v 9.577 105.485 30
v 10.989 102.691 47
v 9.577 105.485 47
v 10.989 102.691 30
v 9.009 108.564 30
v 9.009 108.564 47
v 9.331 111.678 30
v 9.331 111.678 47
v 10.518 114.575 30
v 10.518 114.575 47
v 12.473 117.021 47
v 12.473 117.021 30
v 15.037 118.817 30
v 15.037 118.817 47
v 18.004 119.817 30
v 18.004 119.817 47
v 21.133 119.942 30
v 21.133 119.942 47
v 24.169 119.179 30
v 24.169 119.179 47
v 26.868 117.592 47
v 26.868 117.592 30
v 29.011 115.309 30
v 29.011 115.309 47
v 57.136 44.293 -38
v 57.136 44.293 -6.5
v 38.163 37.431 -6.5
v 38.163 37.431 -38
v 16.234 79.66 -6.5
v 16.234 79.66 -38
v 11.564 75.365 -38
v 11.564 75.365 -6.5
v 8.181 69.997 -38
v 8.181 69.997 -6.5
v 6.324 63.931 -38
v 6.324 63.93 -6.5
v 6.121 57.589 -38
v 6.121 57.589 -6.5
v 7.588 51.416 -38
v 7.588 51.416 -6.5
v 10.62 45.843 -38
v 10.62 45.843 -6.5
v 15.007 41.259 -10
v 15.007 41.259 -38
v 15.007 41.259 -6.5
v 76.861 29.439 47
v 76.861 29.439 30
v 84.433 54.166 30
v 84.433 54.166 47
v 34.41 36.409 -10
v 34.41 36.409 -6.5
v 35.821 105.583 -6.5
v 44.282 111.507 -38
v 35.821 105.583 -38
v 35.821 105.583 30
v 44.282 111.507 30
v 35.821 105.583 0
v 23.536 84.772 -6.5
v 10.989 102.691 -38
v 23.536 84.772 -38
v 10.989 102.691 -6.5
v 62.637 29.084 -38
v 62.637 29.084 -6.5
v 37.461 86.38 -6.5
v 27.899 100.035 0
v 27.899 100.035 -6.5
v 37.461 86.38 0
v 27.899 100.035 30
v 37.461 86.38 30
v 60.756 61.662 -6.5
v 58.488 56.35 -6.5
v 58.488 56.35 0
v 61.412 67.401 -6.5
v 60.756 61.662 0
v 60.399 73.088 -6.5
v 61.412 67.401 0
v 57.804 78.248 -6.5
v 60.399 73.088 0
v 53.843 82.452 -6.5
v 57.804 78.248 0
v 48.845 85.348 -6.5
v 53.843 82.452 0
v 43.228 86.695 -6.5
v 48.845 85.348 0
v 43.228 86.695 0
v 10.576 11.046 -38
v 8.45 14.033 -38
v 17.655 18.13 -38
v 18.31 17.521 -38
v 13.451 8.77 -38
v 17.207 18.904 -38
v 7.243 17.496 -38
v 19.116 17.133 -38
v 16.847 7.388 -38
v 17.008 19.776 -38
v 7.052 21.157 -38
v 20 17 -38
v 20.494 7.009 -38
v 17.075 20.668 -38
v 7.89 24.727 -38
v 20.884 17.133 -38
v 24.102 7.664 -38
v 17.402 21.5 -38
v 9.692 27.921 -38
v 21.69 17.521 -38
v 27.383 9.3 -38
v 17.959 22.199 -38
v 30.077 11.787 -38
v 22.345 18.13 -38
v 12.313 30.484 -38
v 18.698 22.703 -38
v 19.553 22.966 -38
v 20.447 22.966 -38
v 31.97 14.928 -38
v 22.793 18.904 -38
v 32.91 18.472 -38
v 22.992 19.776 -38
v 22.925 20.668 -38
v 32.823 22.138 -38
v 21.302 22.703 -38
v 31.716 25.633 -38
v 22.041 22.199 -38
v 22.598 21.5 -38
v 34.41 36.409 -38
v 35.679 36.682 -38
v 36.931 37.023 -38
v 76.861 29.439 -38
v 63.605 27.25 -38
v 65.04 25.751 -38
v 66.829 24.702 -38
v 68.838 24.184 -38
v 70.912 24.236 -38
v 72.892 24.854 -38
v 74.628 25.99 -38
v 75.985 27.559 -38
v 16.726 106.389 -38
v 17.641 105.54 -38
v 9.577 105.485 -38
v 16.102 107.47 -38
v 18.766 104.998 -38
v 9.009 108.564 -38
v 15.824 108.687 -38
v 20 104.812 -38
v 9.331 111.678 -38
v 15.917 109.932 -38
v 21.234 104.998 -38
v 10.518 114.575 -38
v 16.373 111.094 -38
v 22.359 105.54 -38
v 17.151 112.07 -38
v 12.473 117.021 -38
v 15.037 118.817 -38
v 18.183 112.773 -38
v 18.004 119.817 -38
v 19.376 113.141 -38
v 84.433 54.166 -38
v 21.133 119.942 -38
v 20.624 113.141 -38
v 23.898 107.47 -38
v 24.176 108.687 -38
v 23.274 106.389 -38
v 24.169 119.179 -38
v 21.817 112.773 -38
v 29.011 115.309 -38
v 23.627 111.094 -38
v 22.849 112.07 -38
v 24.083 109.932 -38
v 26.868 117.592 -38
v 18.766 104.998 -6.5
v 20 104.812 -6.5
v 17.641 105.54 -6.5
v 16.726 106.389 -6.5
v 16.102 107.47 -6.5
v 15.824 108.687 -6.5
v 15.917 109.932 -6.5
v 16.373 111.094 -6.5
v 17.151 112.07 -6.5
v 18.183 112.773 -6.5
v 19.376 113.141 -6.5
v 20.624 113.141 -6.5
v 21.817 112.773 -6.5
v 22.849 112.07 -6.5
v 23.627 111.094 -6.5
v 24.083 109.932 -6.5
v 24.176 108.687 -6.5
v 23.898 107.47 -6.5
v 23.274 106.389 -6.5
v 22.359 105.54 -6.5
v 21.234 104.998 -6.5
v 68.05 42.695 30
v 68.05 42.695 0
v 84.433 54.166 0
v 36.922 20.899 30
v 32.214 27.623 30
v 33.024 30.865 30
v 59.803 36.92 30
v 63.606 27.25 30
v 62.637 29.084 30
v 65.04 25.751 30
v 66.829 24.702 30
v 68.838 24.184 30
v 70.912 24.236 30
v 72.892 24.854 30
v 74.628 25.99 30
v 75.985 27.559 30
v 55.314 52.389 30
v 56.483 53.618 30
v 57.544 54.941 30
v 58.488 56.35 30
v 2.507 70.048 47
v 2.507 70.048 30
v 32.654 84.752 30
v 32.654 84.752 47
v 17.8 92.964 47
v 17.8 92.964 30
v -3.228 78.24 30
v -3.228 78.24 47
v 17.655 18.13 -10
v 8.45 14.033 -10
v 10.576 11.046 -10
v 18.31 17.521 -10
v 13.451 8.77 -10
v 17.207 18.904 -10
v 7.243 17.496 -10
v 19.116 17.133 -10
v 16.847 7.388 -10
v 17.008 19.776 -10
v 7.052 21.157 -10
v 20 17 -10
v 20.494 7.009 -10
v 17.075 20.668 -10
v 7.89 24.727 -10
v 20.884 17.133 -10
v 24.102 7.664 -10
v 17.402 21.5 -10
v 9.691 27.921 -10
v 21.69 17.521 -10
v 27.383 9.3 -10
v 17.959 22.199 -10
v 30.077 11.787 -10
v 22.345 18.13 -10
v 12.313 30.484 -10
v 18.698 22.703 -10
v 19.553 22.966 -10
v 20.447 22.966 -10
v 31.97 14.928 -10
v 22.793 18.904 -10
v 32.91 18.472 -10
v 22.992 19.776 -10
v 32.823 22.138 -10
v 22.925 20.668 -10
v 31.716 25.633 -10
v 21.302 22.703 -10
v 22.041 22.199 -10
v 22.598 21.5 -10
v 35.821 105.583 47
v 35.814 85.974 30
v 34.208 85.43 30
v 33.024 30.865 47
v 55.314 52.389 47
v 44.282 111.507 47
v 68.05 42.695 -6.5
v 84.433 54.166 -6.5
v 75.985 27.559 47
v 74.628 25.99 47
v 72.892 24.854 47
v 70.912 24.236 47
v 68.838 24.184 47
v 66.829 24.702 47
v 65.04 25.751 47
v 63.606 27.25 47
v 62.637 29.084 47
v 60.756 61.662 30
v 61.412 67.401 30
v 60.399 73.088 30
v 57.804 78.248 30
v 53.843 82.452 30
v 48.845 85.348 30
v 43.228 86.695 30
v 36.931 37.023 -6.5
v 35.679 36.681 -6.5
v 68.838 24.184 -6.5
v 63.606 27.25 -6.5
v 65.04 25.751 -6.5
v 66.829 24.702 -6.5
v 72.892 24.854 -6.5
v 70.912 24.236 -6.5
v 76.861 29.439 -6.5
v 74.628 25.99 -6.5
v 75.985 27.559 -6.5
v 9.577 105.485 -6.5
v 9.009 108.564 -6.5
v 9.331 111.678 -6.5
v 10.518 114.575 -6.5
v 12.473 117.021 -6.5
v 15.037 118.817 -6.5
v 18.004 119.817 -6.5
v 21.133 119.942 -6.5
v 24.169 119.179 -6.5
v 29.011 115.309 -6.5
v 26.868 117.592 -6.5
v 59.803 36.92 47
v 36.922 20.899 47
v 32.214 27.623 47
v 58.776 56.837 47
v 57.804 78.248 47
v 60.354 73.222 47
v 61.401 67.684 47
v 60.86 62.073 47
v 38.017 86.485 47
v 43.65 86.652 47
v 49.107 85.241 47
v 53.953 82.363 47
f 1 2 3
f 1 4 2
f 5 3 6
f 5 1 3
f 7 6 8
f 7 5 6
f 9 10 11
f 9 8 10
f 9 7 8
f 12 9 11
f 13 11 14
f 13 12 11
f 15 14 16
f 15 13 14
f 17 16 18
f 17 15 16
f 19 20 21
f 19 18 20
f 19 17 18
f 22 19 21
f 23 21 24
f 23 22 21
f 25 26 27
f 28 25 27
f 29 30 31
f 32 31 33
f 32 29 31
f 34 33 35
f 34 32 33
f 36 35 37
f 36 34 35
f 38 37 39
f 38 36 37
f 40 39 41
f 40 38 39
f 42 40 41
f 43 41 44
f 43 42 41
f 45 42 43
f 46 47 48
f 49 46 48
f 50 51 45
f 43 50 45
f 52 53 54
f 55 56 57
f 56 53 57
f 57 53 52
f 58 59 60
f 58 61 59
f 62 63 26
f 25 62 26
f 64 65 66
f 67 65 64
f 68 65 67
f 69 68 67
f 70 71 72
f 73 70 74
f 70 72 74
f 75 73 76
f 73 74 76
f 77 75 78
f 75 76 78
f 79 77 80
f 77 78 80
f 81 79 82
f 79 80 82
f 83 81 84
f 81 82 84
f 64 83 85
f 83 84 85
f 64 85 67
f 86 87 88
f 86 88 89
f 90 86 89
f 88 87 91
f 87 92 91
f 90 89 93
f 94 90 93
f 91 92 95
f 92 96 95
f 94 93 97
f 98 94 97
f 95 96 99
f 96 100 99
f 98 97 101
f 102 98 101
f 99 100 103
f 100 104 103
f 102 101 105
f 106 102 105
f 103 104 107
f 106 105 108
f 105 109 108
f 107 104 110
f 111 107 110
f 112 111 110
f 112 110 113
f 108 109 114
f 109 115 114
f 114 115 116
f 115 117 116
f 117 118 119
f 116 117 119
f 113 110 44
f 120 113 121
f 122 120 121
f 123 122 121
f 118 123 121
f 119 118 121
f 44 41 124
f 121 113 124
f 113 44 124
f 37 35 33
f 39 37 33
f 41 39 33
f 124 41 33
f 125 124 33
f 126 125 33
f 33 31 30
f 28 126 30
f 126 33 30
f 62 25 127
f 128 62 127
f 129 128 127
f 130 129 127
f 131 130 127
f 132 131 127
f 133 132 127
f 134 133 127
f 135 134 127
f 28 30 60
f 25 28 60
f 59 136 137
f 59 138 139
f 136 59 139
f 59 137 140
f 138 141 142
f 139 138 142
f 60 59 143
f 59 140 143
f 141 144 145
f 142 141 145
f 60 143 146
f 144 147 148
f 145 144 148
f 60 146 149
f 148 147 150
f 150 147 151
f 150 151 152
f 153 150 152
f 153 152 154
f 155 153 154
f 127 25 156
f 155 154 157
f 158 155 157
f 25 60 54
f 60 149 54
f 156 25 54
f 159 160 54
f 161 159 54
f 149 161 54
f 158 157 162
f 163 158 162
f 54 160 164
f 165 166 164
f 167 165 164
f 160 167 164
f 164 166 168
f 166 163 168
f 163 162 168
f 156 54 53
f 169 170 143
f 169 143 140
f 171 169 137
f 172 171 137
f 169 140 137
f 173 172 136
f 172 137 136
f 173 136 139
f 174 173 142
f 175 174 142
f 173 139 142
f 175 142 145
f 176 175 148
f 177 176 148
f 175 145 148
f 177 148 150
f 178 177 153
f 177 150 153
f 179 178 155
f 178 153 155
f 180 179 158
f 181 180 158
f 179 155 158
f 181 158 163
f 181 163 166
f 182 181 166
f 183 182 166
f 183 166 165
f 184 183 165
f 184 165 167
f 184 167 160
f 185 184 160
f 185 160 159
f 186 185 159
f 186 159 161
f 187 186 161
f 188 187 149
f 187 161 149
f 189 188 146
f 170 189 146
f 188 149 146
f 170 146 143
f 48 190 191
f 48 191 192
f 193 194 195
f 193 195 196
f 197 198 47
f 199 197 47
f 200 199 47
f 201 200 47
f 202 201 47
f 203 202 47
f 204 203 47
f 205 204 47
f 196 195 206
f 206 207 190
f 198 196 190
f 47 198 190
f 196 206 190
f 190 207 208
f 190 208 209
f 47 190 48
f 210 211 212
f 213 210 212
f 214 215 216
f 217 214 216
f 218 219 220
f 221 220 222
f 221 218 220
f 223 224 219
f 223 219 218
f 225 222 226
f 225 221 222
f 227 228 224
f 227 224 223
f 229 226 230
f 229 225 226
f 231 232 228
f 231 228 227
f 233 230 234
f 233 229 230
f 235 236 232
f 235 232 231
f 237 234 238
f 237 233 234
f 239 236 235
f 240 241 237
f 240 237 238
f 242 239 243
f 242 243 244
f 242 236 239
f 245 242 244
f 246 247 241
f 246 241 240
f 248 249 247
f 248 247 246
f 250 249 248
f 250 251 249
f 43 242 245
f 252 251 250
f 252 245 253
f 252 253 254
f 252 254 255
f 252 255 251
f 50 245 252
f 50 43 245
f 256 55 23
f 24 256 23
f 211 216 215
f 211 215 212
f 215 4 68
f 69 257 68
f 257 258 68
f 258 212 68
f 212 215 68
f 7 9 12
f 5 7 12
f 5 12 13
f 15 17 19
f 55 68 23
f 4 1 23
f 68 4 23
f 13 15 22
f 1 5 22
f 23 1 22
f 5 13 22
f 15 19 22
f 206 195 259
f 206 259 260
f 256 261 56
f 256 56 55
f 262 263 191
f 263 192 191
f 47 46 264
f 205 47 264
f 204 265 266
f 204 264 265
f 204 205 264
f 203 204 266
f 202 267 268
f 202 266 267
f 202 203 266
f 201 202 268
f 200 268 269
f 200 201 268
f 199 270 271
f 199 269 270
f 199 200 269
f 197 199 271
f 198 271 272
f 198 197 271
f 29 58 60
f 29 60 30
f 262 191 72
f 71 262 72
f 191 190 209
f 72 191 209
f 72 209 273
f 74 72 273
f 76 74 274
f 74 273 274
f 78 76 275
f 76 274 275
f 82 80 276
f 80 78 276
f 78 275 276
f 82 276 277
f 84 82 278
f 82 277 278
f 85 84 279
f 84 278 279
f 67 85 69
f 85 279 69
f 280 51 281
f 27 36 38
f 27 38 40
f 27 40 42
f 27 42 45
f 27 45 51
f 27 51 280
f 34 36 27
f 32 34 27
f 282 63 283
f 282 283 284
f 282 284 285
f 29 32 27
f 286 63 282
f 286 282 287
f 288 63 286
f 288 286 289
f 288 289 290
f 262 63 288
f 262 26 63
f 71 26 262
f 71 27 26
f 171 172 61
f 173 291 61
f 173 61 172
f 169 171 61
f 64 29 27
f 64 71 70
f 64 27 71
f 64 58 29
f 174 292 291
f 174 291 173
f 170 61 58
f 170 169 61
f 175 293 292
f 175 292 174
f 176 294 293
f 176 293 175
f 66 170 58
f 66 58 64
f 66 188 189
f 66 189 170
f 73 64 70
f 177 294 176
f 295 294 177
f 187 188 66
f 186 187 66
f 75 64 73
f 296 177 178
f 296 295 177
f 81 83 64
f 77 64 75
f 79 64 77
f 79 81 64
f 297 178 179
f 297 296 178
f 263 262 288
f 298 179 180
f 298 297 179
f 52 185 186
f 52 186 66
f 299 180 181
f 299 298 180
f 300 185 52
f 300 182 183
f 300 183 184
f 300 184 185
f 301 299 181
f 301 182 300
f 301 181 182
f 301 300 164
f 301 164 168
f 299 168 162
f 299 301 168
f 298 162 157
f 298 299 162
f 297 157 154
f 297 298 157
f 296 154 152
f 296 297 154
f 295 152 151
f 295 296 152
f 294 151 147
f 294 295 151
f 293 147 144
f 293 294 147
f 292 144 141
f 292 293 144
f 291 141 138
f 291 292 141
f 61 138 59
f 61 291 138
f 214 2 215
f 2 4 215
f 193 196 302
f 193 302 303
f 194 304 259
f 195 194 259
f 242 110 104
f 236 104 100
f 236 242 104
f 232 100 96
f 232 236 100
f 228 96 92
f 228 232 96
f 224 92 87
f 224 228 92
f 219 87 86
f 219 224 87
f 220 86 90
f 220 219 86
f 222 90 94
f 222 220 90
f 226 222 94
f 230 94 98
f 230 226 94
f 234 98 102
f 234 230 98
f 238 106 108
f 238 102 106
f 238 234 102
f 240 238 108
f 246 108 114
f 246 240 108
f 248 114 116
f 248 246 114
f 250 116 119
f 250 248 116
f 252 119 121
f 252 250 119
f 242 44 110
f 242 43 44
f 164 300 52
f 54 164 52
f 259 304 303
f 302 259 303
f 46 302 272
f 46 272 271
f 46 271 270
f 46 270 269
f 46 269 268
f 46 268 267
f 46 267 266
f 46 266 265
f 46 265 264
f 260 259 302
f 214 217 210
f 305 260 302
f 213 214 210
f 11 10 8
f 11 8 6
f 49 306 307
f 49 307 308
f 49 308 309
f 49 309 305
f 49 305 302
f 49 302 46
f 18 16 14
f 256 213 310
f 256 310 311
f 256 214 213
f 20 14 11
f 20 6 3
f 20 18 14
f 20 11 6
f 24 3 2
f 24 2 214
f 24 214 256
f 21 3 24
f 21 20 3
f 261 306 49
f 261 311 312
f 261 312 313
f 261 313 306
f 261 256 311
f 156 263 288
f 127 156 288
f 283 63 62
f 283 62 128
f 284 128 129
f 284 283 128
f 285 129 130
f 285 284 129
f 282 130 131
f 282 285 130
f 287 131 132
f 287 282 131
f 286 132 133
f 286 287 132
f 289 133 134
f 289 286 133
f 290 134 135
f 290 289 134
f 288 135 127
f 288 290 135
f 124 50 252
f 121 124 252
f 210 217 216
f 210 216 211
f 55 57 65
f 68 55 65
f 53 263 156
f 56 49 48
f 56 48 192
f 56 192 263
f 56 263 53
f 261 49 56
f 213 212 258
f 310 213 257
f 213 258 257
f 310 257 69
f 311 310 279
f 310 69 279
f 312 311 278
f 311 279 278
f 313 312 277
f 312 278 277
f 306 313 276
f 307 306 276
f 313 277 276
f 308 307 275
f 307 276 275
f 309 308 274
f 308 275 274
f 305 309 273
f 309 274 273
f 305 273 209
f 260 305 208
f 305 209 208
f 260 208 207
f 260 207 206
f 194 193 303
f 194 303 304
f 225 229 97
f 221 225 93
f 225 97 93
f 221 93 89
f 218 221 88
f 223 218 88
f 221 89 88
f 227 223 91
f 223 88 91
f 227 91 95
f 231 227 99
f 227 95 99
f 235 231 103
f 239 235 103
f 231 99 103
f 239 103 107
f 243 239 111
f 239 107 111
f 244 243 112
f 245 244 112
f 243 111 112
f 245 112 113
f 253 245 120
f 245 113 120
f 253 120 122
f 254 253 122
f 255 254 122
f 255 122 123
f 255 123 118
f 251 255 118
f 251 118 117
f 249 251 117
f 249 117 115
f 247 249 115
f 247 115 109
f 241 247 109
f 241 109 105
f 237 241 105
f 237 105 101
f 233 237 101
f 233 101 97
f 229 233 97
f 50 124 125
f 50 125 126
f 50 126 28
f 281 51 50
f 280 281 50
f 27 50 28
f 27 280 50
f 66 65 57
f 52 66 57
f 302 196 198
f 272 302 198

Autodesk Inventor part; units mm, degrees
ref_plane "YZ Plane" through (0, 0, 0) normal (1, 0, 0) x (0, 1, 0)
ref_plane "XZ Plane" through (0, 0, 0) normal (0, 1, 0) x (-1, 0, 0)
sketch "Sketch1" plane through (0, 0, 0) normal (0, 0, 1) x (1, 0, 0)
  circle A0 centre (20, 109) radius 11
  circle A1 centre (20, 20) radius 13
  line L0 (20, 109) -> (20, 20) construction
  line L1 (0, 144) -> (0, -24) construction
  line L2 (-16.8865, 0) -> (101.3193, 0) construction
  circle A2 centre (30, 60) radius 24
  line L3 (23.5359, 84.7724) -> (16.2342, 79.6596)
  line L4 (10.9893, 102.6907) -> (23.5359, 84.7724)
  line L5 (30, 60) -> (20, 20) construction
  line L6 (15.0071, 41.2593) -> (12.3132, 30.484)
  line L7 (34.4099, 36.4086) -> (31.7161, 25.6333)
  line L8 (29.0107, 115.3093) -> (35.8214, 105.5826)
  line L9 (35.8214, 105.5826) -> (44.2824, 111.507)
  line L10 (44.2824, 111.507) -> (84.4327, 54.1663)
  line L11 (84.4327, 54.1663) -> (38.1631, 37.4309)
  circle A3 centre (69.6897, 31.6354) radius 7.5
  line L12 (84.4327, 54.1663) -> (76.861, 29.4394)
  line L13 (62.6369, 29.0844) -> (57.1359, 44.2933)
  point P0 (0, 0)
  dimension "d0" = 89
  dimension "d2" = 48
  dimension "d3" = 20
  dimension "d4" = 20
  dimension "d5" = 26
  dimension "d6" = 22
  dimension "d7" = 40
  dimension "d8" = 10
  dimension "d9" = 35
  dimension "d10" = 20
  dimension "d11" = 10
  dimension "d13" = 10.3289
  dimension "d14" = 70
  dimension "d15" = 25
  dimension "d17" = 80
  dimension "d18" = 15
extrude "Extrusion1" add sketch "Sketch1" against normal blind 38
ref_plane "Work Plane1" through (0, 0, 30) normal (0, 0, 1) x (1, 0, 0)
sketch "Sketch2" plane through (0, 0, 30) normal (0, 0, 1) x (1, 0, 0)
  line L0 (10.9893, 102.6907) -> (23.5359, 84.7724) projected
  line L1 (23.5359, 84.7724) -> (16.2342, 79.6596) projected
  arc A0 (16.2342, 79.6596) -> (15.0071, 41.2593) centre (30, 60) ccw projected
  line L2 (15.0071, 41.2593) -> (12.3132, 30.484) projected
  arc A1 (12.3132, 30.484) -> (31.7161, 25.6333) centre (20, 20) ccw projected
  line L3 (31.7161, 25.6333) -> (34.4099, 36.4086) projected
  arc A2 (34.4099, 36.4086) -> (38.1631, 37.4309) centre (30, 60) ccw projected
  line L4 (38.1631, 37.4309) -> (57.1359, 44.2933) projected
  line L5 (57.1359, 44.2933) -> (62.6369, 29.0844) projected
  arc A3 (62.6369, 29.0844) -> (76.861, 29.4394) centre (69.6897, 31.6354) ccw projected
  line L6 (76.861, 29.4394) -> (84.4327, 54.1663) projected
  line L7 (84.4327, 54.1663) -> (44.2824, 111.507) projected
  arc A4 (29.0107, 115.3093) -> (10.9893, 102.6907) centre (20, 109) ccw projected
  line L8 (84.4327, 54.1663) -> (36.9219, 20.8989)
  line L9 (44.2824, 111.507) -> (-3.2284, 78.2395)
  line L10 (35.8214, 105.5826) -> (29.0107, 115.3093) projected
  line L11 (-3.2284, 78.2395) -> (2.5073, 70.048)
  line L12 (36.9219, 20.8989) -> (31.1862, 29.0904)
  line L13 (2.5073, 70.048) -> (31.1862, 29.0904) construction
  circle A5 centre (41.4213, 66.7765) radius 20
  line L14 (41.4213, 66.7765) -> (16.8468, 49.5692) construction
  line L15 (2.5073, 70.048) -> (32.6535, 84.7522)
  line L16 (31.1862, 29.0904) -> (55.3141, 52.3894)
  point P0 (0, 0)
  point P1 (17.8001, 92.9639)
  point P2 (33.0241, 30.8652)
  point P3 (32.2136, 27.6232)
  point P4 (59.8027, 36.9202)
  dimension "d23" = 58
  dimension "d27" = 10
  dimension "d28" = 30
  dimension "d29" = 40
extrude "Extrusion2" add sketch "Sketch2" along normal blind 17 contours A4 L10 L9 L0 | L9 L7 L8 L5 L4 L16 A5 L15 A0 L1 L0 | L0 L1 A0 L15 L11 L9 | L6 A3 L5 L8 | L8 L12 L3 L16 L4 L5
sketch "Sketch3" plane through (0, 0, 30) normal (0, 0, -1) x (-1, 0, 0)
  line L0 (-10.9893, 102.6907) -> (-17.8001, 92.9639) projected
  arc A0 (-10.9893, 102.6907) -> (-29.0107, 115.3093) centre (-20, 109) ccw projected
  line L1 (-35.8214, 105.5826) -> (-29.0107, 115.3093) projected
  line L2 (-44.2824, 111.507) -> (-35.8214, 105.5826) projected
  line L3 (-84.4327, 54.1663) -> (-44.2824, 111.507) projected
  line L4 (-76.861, 29.4394) -> (-84.4327, 54.1663) projected
  arc A1 (-76.861, 29.4394) -> (-62.6369, 29.0844) centre (-69.6897, 31.6354) ccw projected
  line L5 (-59.8027, 36.9202) -> (-62.6369, 29.0844) projected
  line L6 (-36.9219, 20.8989) -> (-59.8027, 36.9202) projected
  line L7 (-32.2136, 27.6232) -> (-36.9219, 20.8989) projected
  line L8 (-33.0241, 30.8652) -> (-32.2136, 27.6232) projected
  line L9 (-55.3141, 52.3894) -> (-33.0241, 30.8652) projected
  arc A2 (-32.6535, 84.7522) -> (-55.3141, 52.3894) centre (-41.4213, 66.7765) ccw projected
  line L10 (-2.5073, 70.048) -> (-32.6535, 84.7522) projected
  line L11 (3.2284, 78.2395) -> (-2.5073, 70.048) projected
  line L12 (-17.8001, 92.9639) -> (3.2284, 78.2395) projected
  line L13 (-59.8027, 36.9202) -> (-84.4327, 54.1663)
  line L14 (-35.8214, 105.5826) -> (-17.8001, 92.9639)
  line L15 (-27.8994, 100.0354) -> (-37.4607, 86.3804)
  line L16 (-84.4327, 54.1663) -> (-44.2824, 111.507) projected
  line L17 (-68.0497, 42.6948) -> (-58.4884, 56.3498)
  line L18 (-32.493, 93.475) -> (-48.8761, 104.9465) construction
  line L19 (-63.269, 49.5223) -> (-79.6521, 60.9938) construction
  point P0 (0, 0)
  dimension "d52" = 20
extrude "Extrusion3" add sketch "Sketch3" along normal up to surface (30 mm away) contours L15 A2 L17 L13 L3 L2 L14
sketch "Sketch4" plane through (0, 0, 0) normal (0, 0, 1) x (1, 0, 0)
  arc A0 (29.0107, 115.3093) -> (10.9893, 102.6907) centre (20, 109) ccw projected
  point P0 (0, 0)
hole "Hole1" at (20, 109, 0) direction (0, 0, -1) diameter 8.376 end through all thread size "M10x1.5" class "6H" standard "ANSI Metric M Profile"
sketch "Sketch5" plane through (0, 0, 0) normal (0, 0, 1) x (1, 0, 0)
  arc A0 (12.3132, 30.484) -> (31.7161, 25.6333) centre (20, 20) ccw projected
  point P0 (0, 0)
hole "Hole2" at (20, 20, 0) direction (0, 0, -1) diameter 6 end through all
sketch "Sketch6" plane through (0, 0, 0) normal (0, 0, 1) x (1, 0, 0)
  circle A0 centre (20, 20) radius 3 projected
  circle A1 centre (20, 109) radius 4.188 projected
  arc A2 (58.4884, 56.3498) -> (37.4607, 86.3804) centre (41.4213, 66.7765) ccw projected
  line L0 (27.8994, 100.0354) -> (35.8214, 105.5826) projected
  line L1 (35.8214, 105.5826) -> (29.0107, 115.3093) projected
  arc A3 (29.0107, 115.3093) -> (10.9893, 102.6907) centre (20, 109) ccw projected
  line L2 (10.9893, 102.6907) -> (23.5359, 84.7724) projected
  arc A4 (16.2342, 79.6596) -> (15.0071, 41.2593) centre (30, 60) ccw projected
  line L3 (15.0071, 41.2593) -> (12.3132, 30.484) projected
  arc A5 (12.3132, 30.484) -> (31.7161, 25.6333) centre (20, 20) ccw projected
  line L4 (31.7161, 25.6333) -> (34.4099, 36.4086) projected
  arc A6 (34.4099, 36.4086) -> (38.1631, 37.4309) centre (30, 60) ccw projected
  line L5 (38.1631, 37.4309) -> (57.1359, 44.2933) projected
  line L6 (34.4099, 36.4086) -> (15.0071, 41.2593)
  line L7 (84.4327, 54.1663) -> (68.0497, 42.6948) projected
  line L8 (68.0497, 42.6948) -> (58.4884, 56.3498) projected
  line L9 (37.4607, 86.3804) -> (27.8994, 100.0354) projected
  line L10 (23.5359, 84.7724) -> (16.2342, 79.6596) projected
  line L11 (57.1359, 44.2933) -> (62.6369, 29.0844) projected
  arc A7 (62.6369, 29.0844) -> (76.861, 29.4394) centre (69.6897, 31.6354) ccw projected
  line L12 (76.861, 29.4394) -> (84.4327, 54.1663) projected
  point P0 (0, 0)
extrude "Extrusion4" cut sketch "Sketch6" against normal blind 10 contours L4 A5 L3 L6
sketch "Sketch7" plane through (0, 0, 0) normal (0, 0, 1) x (1, 0, 0)
  line L0 (15.0071, 41.2593) -> (34.4099, 36.4086) projected
  arc A0 (34.4099, 36.4086) -> (38.1631, 37.4309) centre (30, 60) ccw projected
  line L1 (38.1631, 37.4309) -> (57.1359, 44.2933) projected
  arc A1 (58.4884, 56.3498) -> (37.4607, 86.3804) centre (41.4213, 66.7765) ccw projected
  line L2 (27.8994, 100.0354) -> (35.8214, 105.5826) projected
  line L3 (35.8214, 105.5826) -> (29.0107, 115.3093) projected
  arc A2 (29.0107, 115.3093) -> (10.9893, 102.6907) centre (20, 109) ccw projected
  line L4 (10.9893, 102.6907) -> (23.5359, 84.7724) projected
  arc A3 (16.2342, 79.6596) -> (15.0071, 41.2593) centre (30, 60) ccw projected
  circle A4 centre (20, 109) radius 4.188 projected
  line L5 (19.6524, 94.2609) -> (17.2626, 93.7315)
  line L6 (57.1359, 44.2933) -> (62.6369, 29.0844) projected
  arc A5 (62.6369, 29.0844) -> (76.861, 29.4394) centre (69.6897, 31.6354) ccw projected
  line L7 (76.861, 29.4394) -> (84.4327, 54.1663) projected
  line L8 (84.4327, 54.1663) -> (68.0497, 42.6948) projected
  line L9 (68.0497, 42.6948) -> (58.4884, 56.3498) projected
  line L10 (37.4607, 86.3804) -> (27.8994, 100.0354) projected
  line L11 (23.5359, 84.7724) -> (16.2342, 79.6596) projected
  point P0 (0, 0)
extrude "Extrusion5" cut sketch "Sketch7" against normal blind 6.5
properties part number "F3_Rough_Rear_Caliper_V2"
